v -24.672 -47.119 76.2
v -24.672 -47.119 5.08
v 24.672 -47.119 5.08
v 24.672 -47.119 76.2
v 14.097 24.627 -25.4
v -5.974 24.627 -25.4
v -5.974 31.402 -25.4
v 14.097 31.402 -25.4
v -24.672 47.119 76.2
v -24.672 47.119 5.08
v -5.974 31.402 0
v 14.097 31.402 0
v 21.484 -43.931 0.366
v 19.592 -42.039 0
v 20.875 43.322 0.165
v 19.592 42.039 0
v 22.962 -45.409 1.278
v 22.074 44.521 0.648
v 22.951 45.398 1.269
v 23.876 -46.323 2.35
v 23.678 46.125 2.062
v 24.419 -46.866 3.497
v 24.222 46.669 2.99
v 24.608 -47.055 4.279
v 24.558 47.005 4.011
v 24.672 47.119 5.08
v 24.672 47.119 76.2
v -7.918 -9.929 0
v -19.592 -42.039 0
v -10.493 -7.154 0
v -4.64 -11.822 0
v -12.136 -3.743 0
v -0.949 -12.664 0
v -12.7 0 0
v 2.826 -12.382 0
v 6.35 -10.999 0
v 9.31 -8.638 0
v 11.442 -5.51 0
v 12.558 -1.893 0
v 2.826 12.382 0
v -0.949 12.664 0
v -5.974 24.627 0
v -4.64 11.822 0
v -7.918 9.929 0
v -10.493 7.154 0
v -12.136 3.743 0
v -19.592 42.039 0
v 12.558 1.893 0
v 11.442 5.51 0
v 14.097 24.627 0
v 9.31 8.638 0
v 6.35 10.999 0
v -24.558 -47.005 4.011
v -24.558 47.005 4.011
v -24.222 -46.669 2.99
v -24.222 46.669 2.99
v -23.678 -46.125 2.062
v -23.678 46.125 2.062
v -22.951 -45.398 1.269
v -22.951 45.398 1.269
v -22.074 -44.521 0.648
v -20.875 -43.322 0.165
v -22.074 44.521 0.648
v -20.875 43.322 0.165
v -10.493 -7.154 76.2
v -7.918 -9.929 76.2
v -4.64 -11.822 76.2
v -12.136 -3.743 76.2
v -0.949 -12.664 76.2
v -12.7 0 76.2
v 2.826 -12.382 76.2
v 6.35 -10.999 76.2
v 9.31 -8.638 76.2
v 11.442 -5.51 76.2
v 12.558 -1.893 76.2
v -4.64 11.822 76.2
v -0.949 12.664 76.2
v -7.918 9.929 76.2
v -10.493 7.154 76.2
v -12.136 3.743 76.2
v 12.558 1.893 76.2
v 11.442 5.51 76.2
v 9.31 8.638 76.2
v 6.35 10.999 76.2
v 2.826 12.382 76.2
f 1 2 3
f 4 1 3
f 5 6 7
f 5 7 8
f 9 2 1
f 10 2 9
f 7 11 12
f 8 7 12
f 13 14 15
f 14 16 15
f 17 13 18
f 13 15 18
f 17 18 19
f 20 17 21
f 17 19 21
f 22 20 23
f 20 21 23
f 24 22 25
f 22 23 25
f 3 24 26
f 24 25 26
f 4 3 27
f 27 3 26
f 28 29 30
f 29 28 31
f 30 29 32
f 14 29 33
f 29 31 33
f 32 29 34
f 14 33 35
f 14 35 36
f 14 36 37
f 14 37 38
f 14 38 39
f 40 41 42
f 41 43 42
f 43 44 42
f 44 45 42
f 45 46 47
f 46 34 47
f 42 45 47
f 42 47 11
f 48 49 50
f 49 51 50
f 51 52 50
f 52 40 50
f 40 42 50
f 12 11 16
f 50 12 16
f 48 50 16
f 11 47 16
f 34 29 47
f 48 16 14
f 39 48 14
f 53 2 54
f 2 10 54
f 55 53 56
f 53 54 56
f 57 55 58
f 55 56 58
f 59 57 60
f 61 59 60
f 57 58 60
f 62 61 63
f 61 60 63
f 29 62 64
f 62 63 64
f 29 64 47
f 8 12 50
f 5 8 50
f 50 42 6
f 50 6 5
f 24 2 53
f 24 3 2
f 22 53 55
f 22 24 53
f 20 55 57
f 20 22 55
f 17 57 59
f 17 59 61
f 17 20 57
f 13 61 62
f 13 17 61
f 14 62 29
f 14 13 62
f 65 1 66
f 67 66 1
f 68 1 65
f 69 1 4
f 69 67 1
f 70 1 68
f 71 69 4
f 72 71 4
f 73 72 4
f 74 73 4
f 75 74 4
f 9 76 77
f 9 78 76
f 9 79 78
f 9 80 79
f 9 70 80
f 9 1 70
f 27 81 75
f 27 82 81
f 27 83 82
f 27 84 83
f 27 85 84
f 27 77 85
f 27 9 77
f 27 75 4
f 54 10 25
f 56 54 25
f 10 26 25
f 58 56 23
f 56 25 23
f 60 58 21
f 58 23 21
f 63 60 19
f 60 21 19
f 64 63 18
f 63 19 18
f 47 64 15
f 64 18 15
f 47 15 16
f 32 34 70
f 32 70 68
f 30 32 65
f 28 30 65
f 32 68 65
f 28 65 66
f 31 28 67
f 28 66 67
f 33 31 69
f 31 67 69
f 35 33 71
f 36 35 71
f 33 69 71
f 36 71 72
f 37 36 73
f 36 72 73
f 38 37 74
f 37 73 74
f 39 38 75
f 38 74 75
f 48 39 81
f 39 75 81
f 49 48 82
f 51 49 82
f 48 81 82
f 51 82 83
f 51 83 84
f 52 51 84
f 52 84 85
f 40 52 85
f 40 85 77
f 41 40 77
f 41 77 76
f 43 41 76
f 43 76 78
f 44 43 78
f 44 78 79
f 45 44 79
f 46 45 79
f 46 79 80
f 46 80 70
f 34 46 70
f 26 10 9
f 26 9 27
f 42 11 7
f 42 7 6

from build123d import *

# Parameters (mm, degrees)
F0_W     = 49.34406
F0_H     = 94.238028
F1_DEPTH = 76.2
F3_D     = 25.4
F4_R     = 5.08
F5_W     = 20.071493
F5_H     = 6.775275
F6_DEPTH = 25.4


with BuildPart() as f1:
    # F0 (on Top) → F1 (new body)
    with BuildSketch(Plane.XY):
        Rectangle(F0_W, F0_H)
    extrude(amount=F1_DEPTH)

    # F3 (through all)
    with Locations(Plane(origin=(0, 0, 0), x_dir=(1, 0, 0), z_dir=(0, 0, -1))):
        with Locations((0, 0)):
            Hole(F3_D / 2)

    # F4
    f4_edges = [f1.edges().sort_by_distance(p)[0] for p in [
        (0, 47.119014, 0),
        (-24.67203, 0, 0),
        (24.67203, 0, 0),
        (0, -47.119014, 0),
    ]]
    fillet(f4_edges, radius=F4_R)

    # F5 (on face) → F6 (join)
    with BuildSketch(Plane(origin=(0, 0, 0), x_dir=(1, 0, 0), z_dir=(0, 0, -1))):
        with Locations((4.061457, -28.014188)):
            Rectangle(F5_W, F5_H)
    extrude(amount=F6_DEPTH)


solid = f1.part
